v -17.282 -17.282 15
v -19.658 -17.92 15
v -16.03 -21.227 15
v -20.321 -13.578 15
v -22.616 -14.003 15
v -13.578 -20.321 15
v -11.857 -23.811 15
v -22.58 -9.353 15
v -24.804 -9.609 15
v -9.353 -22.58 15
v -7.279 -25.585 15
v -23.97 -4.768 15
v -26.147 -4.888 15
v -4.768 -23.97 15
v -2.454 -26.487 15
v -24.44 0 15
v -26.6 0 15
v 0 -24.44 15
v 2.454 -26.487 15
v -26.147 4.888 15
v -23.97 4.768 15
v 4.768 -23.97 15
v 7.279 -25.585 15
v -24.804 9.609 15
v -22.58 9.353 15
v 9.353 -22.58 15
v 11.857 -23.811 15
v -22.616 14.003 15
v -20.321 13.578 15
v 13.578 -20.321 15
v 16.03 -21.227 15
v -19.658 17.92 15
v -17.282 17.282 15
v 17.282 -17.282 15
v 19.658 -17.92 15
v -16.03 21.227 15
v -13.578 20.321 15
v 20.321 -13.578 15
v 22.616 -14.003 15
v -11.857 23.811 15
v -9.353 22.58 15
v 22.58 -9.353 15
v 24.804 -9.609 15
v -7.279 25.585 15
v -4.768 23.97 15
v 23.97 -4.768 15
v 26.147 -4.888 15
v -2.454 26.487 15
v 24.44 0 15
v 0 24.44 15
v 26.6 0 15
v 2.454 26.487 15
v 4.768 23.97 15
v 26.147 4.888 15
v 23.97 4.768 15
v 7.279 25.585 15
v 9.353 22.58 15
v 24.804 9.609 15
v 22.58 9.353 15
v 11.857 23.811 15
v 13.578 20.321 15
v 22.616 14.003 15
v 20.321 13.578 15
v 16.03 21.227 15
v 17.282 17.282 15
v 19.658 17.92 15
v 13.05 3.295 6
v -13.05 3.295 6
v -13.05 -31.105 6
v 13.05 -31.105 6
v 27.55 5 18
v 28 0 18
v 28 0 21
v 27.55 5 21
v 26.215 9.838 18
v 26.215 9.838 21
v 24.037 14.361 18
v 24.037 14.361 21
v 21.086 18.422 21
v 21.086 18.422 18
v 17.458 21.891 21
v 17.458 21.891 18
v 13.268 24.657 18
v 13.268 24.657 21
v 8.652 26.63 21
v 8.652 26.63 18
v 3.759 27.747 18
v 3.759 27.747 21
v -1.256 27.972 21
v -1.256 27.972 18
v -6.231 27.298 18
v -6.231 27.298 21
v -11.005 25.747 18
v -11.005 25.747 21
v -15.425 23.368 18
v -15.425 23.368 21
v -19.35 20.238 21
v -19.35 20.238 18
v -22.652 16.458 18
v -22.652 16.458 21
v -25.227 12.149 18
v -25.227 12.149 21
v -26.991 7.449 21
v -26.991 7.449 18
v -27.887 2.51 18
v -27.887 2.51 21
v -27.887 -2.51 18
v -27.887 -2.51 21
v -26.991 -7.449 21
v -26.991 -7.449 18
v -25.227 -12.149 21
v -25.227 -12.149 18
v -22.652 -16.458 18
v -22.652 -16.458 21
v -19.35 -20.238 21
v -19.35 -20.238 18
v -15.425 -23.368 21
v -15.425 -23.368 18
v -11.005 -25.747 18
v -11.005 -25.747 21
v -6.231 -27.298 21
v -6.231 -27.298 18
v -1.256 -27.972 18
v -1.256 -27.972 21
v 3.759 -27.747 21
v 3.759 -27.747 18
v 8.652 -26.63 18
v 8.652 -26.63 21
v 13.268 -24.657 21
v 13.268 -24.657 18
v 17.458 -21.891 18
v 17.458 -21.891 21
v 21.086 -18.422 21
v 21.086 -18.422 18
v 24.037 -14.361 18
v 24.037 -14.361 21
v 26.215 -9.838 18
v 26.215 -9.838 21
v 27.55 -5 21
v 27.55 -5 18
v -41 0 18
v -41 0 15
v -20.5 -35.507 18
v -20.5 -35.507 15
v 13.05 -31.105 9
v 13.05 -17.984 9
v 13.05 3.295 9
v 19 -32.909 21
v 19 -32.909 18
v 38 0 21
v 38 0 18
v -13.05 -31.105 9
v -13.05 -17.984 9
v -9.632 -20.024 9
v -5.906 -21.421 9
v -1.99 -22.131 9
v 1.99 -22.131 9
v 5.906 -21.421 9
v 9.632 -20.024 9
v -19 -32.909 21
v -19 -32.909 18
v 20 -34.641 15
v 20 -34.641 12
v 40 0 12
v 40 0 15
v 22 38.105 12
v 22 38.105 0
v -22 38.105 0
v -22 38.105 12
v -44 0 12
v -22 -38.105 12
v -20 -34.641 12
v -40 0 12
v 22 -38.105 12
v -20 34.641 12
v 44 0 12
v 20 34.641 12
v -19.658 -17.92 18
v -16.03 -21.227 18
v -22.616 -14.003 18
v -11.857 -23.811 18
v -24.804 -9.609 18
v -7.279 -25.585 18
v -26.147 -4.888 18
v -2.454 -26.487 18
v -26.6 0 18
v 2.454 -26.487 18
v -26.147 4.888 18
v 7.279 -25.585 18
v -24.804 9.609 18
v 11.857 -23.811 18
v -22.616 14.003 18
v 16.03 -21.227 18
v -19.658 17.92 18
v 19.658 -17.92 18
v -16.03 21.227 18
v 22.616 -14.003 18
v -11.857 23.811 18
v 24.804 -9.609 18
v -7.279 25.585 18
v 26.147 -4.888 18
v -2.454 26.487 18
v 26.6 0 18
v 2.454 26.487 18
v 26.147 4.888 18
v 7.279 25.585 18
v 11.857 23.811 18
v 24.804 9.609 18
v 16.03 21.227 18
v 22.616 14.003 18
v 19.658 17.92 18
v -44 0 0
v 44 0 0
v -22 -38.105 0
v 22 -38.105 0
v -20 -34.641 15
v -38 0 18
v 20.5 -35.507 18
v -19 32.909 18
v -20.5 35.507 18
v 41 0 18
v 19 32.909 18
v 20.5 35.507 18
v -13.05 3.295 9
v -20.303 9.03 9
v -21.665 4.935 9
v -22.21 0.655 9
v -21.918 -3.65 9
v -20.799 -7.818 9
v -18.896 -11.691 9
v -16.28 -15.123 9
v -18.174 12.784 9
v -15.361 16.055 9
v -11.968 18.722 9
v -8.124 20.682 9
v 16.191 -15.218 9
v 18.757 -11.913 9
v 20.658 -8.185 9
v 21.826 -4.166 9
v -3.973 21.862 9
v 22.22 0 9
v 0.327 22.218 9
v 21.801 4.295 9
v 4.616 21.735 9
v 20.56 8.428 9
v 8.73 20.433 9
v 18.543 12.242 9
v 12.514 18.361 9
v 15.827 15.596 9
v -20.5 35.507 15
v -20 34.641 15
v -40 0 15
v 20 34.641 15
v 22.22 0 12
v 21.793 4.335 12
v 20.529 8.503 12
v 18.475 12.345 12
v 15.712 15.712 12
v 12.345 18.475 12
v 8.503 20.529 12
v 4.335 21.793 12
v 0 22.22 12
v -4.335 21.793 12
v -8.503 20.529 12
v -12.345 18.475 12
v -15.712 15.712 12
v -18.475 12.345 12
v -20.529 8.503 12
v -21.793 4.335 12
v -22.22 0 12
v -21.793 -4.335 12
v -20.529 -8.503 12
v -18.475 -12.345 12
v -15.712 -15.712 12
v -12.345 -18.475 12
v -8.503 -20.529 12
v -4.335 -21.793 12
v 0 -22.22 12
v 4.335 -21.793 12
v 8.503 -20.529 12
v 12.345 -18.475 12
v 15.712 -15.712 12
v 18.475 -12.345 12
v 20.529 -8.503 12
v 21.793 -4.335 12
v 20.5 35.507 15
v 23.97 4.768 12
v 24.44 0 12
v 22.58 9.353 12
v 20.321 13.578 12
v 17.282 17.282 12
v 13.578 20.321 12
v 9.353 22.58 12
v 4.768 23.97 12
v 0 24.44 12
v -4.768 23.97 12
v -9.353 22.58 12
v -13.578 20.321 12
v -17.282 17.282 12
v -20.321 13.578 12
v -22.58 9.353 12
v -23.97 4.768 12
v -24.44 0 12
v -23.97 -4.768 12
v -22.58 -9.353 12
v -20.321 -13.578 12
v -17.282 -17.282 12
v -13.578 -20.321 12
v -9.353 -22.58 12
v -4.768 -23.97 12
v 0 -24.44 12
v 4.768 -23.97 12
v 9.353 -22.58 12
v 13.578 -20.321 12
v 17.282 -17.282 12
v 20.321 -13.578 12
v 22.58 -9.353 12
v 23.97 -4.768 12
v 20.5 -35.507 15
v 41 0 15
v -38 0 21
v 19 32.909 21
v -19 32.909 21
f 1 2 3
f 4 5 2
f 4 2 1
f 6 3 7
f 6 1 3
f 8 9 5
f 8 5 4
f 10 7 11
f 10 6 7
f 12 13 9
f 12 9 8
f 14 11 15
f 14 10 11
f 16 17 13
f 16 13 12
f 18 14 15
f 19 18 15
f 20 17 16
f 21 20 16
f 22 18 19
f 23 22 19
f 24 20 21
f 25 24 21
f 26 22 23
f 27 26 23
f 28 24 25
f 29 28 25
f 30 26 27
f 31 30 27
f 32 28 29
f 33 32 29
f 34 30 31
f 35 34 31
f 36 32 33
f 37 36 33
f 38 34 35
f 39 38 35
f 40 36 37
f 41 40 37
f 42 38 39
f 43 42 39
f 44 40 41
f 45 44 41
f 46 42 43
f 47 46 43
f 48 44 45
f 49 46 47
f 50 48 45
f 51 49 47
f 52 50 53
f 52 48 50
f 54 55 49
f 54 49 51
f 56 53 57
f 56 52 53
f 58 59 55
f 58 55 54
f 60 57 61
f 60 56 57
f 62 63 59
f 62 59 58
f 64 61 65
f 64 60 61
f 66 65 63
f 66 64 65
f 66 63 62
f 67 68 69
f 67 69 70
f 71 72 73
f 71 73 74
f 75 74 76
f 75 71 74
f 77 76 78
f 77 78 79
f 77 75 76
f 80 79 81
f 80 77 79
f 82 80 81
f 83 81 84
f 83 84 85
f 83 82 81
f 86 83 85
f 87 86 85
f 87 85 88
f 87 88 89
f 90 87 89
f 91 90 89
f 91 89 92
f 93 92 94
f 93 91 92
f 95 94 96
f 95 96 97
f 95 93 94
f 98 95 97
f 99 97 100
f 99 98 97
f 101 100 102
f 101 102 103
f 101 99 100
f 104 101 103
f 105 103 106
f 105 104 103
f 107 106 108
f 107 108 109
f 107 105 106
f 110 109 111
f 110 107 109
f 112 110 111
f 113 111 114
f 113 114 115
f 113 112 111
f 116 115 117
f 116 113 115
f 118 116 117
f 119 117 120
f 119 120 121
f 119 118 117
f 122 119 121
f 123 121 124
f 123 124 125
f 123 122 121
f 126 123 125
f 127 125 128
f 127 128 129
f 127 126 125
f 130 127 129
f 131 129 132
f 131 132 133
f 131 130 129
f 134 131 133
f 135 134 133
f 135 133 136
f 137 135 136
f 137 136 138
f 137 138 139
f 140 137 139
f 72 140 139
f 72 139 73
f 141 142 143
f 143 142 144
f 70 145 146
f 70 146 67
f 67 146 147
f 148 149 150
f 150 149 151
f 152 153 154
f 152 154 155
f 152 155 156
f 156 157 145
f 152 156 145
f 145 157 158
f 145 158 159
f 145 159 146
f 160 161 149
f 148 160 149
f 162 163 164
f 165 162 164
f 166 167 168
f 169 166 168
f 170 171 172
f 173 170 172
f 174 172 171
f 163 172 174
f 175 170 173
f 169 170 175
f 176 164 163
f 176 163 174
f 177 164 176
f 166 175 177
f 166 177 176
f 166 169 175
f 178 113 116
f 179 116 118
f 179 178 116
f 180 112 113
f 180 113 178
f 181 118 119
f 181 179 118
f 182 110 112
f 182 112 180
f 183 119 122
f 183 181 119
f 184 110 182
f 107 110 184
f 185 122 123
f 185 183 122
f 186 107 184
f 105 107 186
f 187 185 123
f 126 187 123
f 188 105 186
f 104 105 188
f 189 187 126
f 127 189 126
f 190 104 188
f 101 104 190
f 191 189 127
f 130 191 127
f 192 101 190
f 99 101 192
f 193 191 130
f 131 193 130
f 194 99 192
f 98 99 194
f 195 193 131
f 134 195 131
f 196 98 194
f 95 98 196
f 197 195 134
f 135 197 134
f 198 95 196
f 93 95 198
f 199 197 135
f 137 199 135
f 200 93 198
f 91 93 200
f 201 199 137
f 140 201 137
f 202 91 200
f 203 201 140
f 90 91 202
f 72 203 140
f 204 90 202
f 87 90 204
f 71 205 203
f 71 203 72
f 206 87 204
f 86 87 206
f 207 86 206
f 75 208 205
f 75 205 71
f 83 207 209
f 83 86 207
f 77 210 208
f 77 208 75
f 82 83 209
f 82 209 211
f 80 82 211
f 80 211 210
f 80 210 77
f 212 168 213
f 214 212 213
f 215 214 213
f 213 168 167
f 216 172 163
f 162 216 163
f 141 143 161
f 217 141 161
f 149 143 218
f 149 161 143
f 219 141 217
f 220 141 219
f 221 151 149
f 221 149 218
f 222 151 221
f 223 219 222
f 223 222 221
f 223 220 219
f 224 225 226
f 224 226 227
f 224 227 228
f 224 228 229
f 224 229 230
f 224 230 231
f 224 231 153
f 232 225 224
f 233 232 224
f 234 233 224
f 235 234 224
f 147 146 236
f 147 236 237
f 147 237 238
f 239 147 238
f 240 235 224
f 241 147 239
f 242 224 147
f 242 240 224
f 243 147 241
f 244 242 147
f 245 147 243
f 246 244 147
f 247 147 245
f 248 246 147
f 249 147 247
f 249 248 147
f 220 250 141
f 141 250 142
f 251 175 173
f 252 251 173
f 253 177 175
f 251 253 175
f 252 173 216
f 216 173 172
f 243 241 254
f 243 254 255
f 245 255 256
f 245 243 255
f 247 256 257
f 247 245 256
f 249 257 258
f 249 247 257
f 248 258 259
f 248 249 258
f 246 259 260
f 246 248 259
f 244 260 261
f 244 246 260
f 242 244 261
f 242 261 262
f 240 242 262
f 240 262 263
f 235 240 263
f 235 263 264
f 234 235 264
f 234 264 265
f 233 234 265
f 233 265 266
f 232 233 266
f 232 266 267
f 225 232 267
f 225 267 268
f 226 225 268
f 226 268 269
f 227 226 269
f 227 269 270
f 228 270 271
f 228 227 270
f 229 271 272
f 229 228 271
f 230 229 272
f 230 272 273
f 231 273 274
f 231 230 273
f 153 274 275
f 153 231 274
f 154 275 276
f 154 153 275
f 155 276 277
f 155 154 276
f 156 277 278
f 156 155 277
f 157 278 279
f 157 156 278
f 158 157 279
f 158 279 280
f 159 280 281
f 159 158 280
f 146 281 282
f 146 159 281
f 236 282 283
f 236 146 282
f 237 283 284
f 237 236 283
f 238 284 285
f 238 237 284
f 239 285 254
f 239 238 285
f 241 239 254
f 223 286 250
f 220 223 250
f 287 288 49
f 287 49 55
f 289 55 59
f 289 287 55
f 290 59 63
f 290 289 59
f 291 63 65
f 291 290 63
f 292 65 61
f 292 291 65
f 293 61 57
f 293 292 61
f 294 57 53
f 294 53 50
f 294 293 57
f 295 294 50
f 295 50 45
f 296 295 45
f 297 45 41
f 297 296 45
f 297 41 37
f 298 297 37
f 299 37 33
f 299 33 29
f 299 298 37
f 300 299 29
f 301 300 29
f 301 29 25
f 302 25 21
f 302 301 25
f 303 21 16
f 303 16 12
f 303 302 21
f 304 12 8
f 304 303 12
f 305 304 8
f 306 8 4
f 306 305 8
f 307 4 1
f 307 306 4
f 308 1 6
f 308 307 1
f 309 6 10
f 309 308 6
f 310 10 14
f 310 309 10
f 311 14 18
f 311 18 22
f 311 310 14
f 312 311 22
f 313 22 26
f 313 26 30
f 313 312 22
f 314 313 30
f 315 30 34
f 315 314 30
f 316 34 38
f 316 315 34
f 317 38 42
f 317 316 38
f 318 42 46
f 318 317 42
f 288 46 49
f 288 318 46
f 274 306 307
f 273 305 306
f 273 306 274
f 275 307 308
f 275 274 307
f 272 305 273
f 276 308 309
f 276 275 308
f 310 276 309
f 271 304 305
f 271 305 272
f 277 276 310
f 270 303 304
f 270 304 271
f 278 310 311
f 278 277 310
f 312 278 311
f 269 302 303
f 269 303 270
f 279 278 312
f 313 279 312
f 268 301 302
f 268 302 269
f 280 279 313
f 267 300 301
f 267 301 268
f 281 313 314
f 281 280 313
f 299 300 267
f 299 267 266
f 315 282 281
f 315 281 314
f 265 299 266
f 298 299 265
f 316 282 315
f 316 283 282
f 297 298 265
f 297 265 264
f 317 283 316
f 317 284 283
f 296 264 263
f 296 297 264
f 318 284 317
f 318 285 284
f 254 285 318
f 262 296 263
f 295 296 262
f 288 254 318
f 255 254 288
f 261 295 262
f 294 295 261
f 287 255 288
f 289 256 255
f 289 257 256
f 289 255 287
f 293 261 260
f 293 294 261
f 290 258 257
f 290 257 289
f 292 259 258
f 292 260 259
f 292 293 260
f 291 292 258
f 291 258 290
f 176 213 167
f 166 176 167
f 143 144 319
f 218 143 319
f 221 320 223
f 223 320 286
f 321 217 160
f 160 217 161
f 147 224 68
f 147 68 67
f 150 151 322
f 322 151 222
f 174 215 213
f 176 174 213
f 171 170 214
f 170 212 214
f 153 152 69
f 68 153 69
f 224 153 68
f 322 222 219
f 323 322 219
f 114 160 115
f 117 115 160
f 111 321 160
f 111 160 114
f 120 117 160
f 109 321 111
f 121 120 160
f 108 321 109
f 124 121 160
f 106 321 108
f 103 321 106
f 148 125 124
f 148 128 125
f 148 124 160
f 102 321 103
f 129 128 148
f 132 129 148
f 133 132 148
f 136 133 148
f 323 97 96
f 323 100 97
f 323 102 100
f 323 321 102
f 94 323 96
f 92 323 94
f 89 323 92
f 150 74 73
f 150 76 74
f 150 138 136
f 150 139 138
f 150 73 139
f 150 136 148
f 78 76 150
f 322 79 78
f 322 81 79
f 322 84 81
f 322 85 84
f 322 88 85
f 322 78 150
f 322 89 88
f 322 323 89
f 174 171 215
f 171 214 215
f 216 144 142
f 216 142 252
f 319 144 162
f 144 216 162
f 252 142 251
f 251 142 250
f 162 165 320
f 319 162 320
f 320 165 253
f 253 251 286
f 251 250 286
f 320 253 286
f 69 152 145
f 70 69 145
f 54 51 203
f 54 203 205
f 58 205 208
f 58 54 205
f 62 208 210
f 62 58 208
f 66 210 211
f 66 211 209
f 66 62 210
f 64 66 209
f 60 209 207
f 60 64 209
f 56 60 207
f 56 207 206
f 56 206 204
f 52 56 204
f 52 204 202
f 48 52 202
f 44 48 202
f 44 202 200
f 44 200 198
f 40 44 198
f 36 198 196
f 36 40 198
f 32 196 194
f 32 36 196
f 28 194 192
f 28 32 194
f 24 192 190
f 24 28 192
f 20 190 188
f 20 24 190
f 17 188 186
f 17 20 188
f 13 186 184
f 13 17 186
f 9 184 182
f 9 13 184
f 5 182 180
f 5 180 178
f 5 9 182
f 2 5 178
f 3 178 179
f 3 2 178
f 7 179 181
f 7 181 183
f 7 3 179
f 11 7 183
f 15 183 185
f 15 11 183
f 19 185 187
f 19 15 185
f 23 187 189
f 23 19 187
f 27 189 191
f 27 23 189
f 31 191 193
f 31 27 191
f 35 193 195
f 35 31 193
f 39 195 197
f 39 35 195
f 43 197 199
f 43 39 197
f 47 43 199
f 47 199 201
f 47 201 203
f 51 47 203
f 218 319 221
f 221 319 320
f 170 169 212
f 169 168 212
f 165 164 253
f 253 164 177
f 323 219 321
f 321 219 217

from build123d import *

# Parameters (mm, degrees)
PAD_DEPTH    = 9
SKETCH001_W  = 26.1
SKETCH001_H  = 34.4
POCKET_DEPTH = 3
SKETCH002_R  = 22.22
PAD001_DEPTH = 3
SKETCH003_R  = 24.44
PAD002_DEPTH = 3
SKETCH004_R  = 26.6
PAD003_DEPTH = 3
SKETCH005_R  = 28
PAD004_DEPTH = 3


with BuildPart() as part:
    # Sketch → Pad (new body)
    with BuildSketch(Plane.XY):
        Polygon((44, 0), (22, 38.105118), (-22, 38.105118), (-44, 0), (-22, -38.105118), (22, -38.105118), align=None)
    extrude(amount=PAD_DEPTH)

    # Sketch001 (on Face8 of Pad) → Pocket (cut)
    with BuildSketch(Plane.XY.offset(9)):
        with Locations((0, -13.905118)):
            Rectangle(SKETCH001_W, SKETCH001_H)
    extrude(amount=-POCKET_DEPTH, mode=Mode.SUBTRACT)

    # Sketch002 (on Face5 of Pocket) → Pad001 (join)
    with BuildSketch(Plane.XY.offset(9)):
        Polygon((22, 38.105118), (-22, 38.105118), (-44, 0), (-22, -38.105118), (22, -38.105118), (44, 0), align=None)
        Circle(SKETCH002_R, mode=Mode.SUBTRACT)
    extrude(amount=PAD001_DEPTH)

    # Sketch003 (on Face14 of Pad001) → Pad002 (join)
    with BuildSketch(Plane.XY.offset(12)):
        Polygon((40, 0), (20, 34.641016), (-20, 34.641016), (-40, 0), (-20, -34.641016), (20, -34.641016), align=None)
        Circle(SKETCH003_R, mode=Mode.SUBTRACT)
    extrude(amount=PAD002_DEPTH)

    # Sketch004 (on Face21 of Pad002) → Pad003 (join)
    with BuildSketch(Plane.XY.offset(15)):
        Polygon((41, 0), (20.5, 35.507042), (-20.5, 35.507042), (-41, 0), (-20.5, -35.507042), (20.5, -35.507042), align=None)
        Circle(SKETCH004_R, mode=Mode.SUBTRACT)
    extrude(amount=PAD003_DEPTH)

    # Sketch005 (on Face28 of Pad003) → Pad004 (join)
    with BuildSketch(Plane.XY.offset(18)):
        Polygon((19, 32.908965), (-19, 32.908965), (-38, 0), (-19, -32.908965), (19, -32.908965), (38, 0), align=None)
        Circle(SKETCH005_R, mode=Mode.SUBTRACT)
    extrude(amount=PAD004_DEPTH)


solid = part.part
